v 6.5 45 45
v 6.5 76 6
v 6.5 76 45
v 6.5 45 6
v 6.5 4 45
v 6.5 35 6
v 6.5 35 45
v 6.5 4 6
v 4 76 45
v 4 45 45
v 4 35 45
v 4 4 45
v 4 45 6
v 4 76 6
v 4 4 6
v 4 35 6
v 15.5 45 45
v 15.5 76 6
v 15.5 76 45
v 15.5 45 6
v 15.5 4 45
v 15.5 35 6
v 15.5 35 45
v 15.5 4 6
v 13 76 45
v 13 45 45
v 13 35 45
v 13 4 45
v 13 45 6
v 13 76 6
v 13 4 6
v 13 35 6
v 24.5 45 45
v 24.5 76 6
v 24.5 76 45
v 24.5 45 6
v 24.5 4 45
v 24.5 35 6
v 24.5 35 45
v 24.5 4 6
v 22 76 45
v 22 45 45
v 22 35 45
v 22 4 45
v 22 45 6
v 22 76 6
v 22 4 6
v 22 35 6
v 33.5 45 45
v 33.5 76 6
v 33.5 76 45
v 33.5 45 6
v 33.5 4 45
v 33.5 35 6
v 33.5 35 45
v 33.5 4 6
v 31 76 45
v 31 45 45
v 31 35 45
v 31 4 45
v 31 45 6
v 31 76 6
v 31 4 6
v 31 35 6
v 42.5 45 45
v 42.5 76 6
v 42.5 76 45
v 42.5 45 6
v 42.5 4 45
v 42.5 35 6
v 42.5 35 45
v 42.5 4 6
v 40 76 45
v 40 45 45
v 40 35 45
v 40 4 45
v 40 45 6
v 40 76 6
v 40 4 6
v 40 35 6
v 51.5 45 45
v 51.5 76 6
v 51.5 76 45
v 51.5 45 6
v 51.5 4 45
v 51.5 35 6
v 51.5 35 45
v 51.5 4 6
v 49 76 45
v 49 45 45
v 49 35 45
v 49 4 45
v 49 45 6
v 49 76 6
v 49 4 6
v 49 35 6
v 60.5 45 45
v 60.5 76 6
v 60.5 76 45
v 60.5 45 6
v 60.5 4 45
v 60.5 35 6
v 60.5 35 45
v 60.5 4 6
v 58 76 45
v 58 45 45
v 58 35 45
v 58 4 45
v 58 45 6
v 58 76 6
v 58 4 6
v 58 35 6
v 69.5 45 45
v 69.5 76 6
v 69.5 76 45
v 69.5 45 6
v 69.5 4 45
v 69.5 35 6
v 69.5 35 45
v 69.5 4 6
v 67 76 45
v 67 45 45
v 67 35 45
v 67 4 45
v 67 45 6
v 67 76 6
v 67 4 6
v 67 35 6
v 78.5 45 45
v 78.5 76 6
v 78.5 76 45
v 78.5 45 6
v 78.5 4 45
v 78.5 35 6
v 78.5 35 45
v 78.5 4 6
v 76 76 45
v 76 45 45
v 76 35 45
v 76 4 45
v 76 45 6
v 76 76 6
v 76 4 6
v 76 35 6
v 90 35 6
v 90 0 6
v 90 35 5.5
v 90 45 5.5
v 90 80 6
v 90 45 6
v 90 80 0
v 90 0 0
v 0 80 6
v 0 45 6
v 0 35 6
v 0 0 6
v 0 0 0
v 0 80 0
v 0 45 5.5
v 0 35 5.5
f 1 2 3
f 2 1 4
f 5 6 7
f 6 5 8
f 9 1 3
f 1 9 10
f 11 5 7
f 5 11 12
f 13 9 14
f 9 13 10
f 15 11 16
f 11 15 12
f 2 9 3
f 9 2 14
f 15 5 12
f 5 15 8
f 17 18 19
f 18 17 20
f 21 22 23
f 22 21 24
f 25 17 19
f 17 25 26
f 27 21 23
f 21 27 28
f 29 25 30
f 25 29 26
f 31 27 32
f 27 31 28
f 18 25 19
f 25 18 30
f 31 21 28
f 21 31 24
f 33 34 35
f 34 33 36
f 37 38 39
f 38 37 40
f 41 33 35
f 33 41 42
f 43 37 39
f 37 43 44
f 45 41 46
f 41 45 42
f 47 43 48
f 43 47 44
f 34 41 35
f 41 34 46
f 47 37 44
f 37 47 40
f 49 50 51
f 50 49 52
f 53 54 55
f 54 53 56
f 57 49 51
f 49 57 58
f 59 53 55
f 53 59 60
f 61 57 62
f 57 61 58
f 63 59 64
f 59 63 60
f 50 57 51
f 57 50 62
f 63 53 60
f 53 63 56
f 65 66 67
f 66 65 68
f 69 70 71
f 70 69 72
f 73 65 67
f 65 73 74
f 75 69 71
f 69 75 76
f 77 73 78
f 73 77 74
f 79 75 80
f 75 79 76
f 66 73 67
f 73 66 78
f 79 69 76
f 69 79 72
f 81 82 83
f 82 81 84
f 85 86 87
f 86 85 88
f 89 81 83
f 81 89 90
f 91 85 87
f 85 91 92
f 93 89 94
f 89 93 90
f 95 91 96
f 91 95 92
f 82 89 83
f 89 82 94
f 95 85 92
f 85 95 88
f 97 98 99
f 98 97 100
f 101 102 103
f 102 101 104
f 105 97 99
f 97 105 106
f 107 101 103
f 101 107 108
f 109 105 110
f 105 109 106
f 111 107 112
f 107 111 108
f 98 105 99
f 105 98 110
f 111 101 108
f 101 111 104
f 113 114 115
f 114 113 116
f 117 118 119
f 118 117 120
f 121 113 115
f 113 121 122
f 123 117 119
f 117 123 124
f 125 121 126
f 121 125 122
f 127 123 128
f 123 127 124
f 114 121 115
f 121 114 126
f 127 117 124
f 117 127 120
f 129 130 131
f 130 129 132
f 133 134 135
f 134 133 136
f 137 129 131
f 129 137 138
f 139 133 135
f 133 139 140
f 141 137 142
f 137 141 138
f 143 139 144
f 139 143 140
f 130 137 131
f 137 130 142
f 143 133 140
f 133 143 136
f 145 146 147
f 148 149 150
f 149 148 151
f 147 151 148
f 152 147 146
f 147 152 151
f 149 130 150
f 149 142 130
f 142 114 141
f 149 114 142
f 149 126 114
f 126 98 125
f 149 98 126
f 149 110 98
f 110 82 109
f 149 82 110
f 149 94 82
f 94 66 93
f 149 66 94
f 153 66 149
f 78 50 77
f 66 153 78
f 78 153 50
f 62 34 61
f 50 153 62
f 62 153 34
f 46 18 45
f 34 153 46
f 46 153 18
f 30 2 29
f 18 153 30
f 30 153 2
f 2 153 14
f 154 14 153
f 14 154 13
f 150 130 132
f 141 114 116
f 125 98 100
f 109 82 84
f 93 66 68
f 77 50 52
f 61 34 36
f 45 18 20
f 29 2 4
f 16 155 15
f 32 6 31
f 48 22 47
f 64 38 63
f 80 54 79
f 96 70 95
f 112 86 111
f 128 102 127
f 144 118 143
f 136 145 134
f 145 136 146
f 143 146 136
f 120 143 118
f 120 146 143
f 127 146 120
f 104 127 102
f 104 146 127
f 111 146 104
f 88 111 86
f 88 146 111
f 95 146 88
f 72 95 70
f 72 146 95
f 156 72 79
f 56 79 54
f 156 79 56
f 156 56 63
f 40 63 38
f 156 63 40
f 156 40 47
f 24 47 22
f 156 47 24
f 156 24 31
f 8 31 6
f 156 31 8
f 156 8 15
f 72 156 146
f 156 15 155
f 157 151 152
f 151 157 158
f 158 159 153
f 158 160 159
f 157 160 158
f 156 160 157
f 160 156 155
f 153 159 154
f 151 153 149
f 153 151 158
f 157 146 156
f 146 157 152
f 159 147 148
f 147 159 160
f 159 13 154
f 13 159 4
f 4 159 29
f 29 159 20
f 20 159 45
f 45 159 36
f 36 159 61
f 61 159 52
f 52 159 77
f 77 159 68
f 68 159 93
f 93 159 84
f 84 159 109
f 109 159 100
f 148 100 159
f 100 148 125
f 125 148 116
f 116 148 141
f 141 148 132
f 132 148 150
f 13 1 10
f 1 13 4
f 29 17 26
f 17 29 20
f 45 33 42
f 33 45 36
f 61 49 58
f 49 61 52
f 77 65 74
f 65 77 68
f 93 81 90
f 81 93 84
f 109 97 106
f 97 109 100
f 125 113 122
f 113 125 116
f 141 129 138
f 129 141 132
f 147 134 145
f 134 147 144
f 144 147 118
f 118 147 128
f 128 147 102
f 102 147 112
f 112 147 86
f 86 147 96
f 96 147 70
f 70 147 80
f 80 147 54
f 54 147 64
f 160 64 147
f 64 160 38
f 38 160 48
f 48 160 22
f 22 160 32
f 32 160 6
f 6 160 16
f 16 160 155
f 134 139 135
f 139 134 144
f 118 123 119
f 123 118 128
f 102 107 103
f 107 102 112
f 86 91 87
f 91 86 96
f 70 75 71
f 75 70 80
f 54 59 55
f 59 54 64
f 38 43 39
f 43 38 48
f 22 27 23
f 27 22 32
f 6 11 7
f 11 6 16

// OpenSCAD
$fn = 32;

// ----------------------------------------------------------------------
// Heatsink: slotted fin block
// ----------------------------------------------------------------------

// --- parameters (mm) ---
base_l = 90;              // base length, X
base_w = 80;              // base width, Y
base_t = 6;               // base plate thickness
fin_h = 40;               // fin height above the base
fin_t = 2.5;              // fin thickness
edge = 4;                 // margin from the base ends
pitch = 9;                // fin pitch
slot_w = 10;              // central slot width, Y

n_fins = floor((base_l - 2 * edge - fin_t) / pitch) + 1;  // fin count
total_h = base_t + fin_h - 1;  // overall height

difference() {
union() {
  cube([base_l, base_w, base_t]);
  for (i = [0 : n_fins - 1])
    translate([edge + i * pitch, edge, base_t - 1])
      cube([fin_t, base_w - 2 * edge, fin_h]);
}
  translate([-1, base_w / 2 - slot_w / 2, base_t - 0.5])
    cube([base_l + 2, slot_w, fin_h + 2]);
}
